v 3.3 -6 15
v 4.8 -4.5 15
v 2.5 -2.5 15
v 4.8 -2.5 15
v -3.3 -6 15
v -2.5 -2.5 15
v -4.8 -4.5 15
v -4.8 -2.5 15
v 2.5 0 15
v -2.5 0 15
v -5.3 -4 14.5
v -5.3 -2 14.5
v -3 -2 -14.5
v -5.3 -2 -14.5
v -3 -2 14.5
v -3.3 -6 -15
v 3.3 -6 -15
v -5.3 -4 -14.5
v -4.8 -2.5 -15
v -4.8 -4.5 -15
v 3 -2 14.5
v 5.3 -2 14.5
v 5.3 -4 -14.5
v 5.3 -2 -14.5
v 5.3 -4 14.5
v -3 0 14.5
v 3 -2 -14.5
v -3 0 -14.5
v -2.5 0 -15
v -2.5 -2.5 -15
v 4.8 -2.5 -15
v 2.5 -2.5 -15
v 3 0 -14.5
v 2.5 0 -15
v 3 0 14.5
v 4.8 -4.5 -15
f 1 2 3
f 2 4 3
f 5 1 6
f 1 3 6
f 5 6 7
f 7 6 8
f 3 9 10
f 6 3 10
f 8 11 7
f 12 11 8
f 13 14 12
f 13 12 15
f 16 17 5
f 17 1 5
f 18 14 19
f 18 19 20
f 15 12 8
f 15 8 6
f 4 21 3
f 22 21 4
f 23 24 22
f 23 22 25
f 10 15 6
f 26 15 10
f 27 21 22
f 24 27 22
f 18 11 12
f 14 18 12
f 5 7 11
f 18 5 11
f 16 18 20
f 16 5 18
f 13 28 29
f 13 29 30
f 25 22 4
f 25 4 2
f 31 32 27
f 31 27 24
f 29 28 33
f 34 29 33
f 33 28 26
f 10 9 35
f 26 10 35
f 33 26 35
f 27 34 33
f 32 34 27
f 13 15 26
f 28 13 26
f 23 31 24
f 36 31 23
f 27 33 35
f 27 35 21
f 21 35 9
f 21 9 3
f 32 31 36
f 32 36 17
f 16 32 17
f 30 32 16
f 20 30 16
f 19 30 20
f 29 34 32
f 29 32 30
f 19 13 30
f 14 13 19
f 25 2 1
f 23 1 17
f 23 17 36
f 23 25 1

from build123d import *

# Parameters (mm, degrees)
EXTRUDE_1_DEPTH  = 15
CHAMFER_1_SIZE   = 2
CHAMFER_2_SIZE   = 0.5
MIRROR_START     = -8.660254038
MIRROR_2_DEPTH   = 2.193931023
MIRROR_START_2   = 6.466323015
MIRROR_2_2_DEPTH = 2.193931023


# Read off the part's stored shape, not the designer's step: 镜向2
with BuildPart() as part:
    # 草图1 → 凸台-拉伸1 (new, symmetric)
    with BuildSketch(Plane.XY):
        Polygon((-3, 0), (3, 0), (3, -2), (5.3, -2), (5.3, -6), (-5.3, -6), (-5.3, -2), (-3, -2), align=None)
    extrude(amount=EXTRUDE_1_DEPTH, both=True)

    # 倒角1
    chamfer_1_edges = [part.edges().sort_by_distance(p)[0] for p in [
        (5.3, -6, 0),
        (-5.3, -6, 0),
    ]]
    chamfer(chamfer_1_edges, length=CHAMFER_1_SIZE)

    # 倒角2
    chamfer_2_edges = [part.edges().sort_by_distance(p)[0] for p in [
        (-3, -1, 15),
        (-4.15, -2, 15),
        (-5.3, -3, 15),
        (5.3, -3, 15),
        (4.15, -2, 15),
        (3, -1, 15),
    ]]
    chamfer(chamfer_2_edges, length=CHAMFER_2_SIZE)

    # 镜向2 outline → 镜向2 (cut)
    with BuildSketch(Plane(origin=(0, 0, 0), x_dir=(0.8164965809277261, -0.4082482904638631, -0.4082482904638625), z_dir=(0.5773502691896255, 0.5773502691896263, 0.5773502691896255)).offset(MIRROR_START)):
        Polygon((9.185586535, 8.838834765), (11.063528672, 8.838834765), (11.880025252, 7.424621202), (12.702530685, 6), (13, 6), (13, 12), (7.360486936, 12), (8.164965809, 10.606601718), align=None)
    extrude(amount=MIRROR_2_DEPTH, mode=Mode.SUBTRACT)

    # Mirror 2 2 outline → Mirror 2 2 (cut)
    with BuildSketch(Plane(origin=(0, 0, 0), x_dir=(0.816496580927727, 0.4082482904638606, 0.4082482904638635), z_dir=(0.5773502691896244, -0.5773502691896244, -0.5773502691896285)).offset(MIRROR_START_2)):
        Polygon((-8.164965809, -10.606601718), (-9.185586535, -8.838834765), (-11.063528672, -8.838834765), (-11.880025252, -7.424621202), (-12.702530685, -6), (-13, -6), (-13, -12), (-7.360486936, -12), align=None)
    extrude(amount=MIRROR_2_2_DEPTH, mode=Mode.SUBTRACT)


solid = part.part
